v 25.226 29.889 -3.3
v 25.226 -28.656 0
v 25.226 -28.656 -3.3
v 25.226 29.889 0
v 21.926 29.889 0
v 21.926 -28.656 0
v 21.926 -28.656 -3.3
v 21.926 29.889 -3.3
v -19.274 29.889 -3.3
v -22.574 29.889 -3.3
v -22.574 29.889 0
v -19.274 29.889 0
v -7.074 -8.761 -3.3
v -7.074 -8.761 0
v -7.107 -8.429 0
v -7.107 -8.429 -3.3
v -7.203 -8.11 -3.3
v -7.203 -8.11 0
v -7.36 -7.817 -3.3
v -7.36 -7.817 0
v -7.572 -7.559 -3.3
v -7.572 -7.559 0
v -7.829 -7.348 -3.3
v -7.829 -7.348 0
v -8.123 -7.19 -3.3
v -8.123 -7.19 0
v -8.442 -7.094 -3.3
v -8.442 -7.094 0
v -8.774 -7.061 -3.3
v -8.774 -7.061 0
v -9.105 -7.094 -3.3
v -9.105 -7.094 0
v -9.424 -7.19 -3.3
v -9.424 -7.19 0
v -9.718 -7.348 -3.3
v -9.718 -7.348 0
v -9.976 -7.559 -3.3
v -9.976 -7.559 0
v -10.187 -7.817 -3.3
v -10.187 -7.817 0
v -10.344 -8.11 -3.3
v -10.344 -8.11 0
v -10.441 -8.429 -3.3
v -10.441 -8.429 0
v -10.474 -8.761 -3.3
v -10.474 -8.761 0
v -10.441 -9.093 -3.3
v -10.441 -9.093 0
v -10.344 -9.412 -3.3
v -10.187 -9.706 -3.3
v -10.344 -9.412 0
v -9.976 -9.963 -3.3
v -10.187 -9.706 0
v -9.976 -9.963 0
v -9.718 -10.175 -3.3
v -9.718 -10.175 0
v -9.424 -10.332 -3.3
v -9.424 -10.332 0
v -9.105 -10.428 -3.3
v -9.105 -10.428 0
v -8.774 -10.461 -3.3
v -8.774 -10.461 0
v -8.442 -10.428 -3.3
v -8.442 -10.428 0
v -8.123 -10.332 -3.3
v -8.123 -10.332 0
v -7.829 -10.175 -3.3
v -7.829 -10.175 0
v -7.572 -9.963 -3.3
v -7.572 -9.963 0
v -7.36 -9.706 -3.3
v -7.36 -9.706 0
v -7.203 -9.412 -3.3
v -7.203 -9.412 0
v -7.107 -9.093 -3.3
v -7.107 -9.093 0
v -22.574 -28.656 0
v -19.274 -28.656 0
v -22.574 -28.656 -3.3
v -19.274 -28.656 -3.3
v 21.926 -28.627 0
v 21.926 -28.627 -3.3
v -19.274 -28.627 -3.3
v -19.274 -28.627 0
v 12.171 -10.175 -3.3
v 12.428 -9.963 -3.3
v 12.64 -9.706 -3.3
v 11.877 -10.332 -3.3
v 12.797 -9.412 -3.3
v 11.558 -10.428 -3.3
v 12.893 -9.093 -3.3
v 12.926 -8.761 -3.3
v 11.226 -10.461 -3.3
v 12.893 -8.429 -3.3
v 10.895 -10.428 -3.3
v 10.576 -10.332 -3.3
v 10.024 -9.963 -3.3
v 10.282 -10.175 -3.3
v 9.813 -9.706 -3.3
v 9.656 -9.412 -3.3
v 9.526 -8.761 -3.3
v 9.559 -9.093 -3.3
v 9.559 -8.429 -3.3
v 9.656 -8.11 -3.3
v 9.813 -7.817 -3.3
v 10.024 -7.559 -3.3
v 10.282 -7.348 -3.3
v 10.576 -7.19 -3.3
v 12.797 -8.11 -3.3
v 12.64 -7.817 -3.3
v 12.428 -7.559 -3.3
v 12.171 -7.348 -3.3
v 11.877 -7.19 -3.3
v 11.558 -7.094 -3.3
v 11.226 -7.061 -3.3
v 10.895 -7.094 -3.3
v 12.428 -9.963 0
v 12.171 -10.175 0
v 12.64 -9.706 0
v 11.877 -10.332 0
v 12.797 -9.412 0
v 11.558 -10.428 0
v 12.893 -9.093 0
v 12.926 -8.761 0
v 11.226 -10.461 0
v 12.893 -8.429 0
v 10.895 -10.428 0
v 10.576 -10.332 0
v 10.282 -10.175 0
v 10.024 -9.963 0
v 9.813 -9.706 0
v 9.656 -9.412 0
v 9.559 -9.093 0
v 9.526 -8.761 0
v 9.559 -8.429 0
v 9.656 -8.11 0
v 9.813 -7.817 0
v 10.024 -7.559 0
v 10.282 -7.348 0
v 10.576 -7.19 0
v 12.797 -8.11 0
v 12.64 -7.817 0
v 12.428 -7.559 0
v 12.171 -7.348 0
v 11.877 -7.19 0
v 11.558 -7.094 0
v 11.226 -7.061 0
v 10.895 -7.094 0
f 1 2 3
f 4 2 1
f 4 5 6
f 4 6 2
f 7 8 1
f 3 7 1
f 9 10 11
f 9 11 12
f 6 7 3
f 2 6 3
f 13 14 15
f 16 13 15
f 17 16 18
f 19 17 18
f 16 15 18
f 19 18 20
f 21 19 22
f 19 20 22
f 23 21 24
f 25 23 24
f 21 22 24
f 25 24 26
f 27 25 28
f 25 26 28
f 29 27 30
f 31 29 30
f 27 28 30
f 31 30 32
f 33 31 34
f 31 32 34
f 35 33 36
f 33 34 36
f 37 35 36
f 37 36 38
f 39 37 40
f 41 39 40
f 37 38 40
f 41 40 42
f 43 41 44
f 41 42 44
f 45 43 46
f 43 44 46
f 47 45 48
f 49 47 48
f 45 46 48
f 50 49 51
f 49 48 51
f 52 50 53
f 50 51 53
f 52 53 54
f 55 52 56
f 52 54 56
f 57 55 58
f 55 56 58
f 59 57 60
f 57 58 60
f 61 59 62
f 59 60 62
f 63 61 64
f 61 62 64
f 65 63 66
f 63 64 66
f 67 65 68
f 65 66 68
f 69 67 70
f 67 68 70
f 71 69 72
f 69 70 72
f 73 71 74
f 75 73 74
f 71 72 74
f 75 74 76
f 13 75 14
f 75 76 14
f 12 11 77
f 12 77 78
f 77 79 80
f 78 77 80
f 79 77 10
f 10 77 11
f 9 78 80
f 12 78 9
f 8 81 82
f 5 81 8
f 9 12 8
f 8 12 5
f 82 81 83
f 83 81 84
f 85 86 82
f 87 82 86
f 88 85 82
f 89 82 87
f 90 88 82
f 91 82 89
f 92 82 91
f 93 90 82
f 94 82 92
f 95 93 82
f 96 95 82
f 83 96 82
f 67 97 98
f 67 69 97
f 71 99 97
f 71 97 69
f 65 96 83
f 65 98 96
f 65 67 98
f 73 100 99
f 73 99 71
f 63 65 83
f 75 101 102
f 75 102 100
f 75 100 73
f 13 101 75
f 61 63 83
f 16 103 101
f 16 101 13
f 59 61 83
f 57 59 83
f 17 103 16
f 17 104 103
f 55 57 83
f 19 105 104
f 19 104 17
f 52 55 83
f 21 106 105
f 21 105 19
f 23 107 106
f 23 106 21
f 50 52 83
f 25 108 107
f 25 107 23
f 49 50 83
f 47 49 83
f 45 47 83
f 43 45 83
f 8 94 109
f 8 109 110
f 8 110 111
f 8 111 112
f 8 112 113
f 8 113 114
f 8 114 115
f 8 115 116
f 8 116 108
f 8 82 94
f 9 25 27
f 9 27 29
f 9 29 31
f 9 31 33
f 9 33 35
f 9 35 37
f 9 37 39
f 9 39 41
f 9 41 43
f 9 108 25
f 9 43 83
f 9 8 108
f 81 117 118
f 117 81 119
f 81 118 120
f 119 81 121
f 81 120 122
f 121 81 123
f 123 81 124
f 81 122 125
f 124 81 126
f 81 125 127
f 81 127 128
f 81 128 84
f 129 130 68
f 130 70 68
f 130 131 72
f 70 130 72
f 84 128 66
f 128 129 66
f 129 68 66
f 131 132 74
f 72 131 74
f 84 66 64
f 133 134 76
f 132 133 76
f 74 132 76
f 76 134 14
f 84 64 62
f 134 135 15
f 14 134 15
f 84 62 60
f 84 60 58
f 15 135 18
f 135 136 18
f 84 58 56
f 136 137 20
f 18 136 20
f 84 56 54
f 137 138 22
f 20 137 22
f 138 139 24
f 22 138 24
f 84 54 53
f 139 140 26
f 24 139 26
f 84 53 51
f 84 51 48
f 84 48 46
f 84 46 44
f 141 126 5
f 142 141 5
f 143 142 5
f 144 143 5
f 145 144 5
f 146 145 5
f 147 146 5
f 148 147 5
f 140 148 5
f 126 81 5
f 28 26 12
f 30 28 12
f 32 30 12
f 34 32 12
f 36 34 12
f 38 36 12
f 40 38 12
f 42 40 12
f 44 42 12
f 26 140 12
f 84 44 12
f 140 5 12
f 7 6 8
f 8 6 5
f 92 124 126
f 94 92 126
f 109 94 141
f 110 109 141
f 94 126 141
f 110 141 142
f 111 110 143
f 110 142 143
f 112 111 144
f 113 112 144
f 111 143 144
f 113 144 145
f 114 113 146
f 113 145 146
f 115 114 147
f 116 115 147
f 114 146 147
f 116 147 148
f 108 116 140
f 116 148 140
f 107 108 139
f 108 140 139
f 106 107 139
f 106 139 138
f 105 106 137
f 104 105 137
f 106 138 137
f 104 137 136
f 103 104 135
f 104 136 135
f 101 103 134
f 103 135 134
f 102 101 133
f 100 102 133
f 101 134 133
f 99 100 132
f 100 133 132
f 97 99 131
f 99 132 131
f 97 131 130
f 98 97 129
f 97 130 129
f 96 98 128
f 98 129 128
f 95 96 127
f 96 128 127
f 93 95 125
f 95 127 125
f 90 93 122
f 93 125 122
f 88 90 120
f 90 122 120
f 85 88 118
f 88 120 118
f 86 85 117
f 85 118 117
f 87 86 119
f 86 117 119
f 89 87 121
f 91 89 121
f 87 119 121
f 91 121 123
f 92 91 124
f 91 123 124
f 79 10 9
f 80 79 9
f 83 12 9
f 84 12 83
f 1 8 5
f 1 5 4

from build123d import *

# Parameters (mm, degrees)
SKETCH_1_R        = 1.7
EXTRUDE_1_DEPTH   = 3.3
SKETCH_2_W        = 3.3
SKETCH_2_H        = 58.544472475
EXTRUDE_2_DEPTH   = 3.3
EXTRUDE_2_2_DEPTH = 3.3


with BuildPart() as part:
    # 草圖1 → 填料-伸長1 (new body)
    with BuildSketch(Plane.XY):
        Polygon((21.926158038, 28.738964578), (21.926158038, -28.626702997), (-19.273841962, -28.626702997), (-19.273841962, 28.738964578), (-19.273841962, 29.888964578), (21.926158038, 29.888964578), align=None)
        with Locations((11.226158038, -8.761035422)):
            Circle(SKETCH_1_R, mode=Mode.SUBTRACT)
        with Locations((-8.773841962, -8.761035422)):
            Circle(SKETCH_1_R, mode=Mode.SUBTRACT)
    extrude(amount=-EXTRUDE_1_DEPTH)


with BuildPart() as body_2:
    # 草圖2 → 填料-伸長2 (new body)
    with BuildSketch(Plane.XY):
        with Locations((23.576158038, 0.61672834)):
            Rectangle(SKETCH_2_W, SKETCH_2_H)
    extrude(amount=-EXTRUDE_2_DEPTH)


with BuildPart() as body_3:
    # 草圖2 → Extrude 2 2 (new body)
    with BuildSketch(Plane.XY):
        with Locations((-20.923841962, 0.61672834)):
            Rectangle(SKETCH_2_W, SKETCH_2_H)
    extrude(amount=-EXTRUDE_2_2_DEPTH)


solid = Compound([part.part, body_2.part, body_3.part])
